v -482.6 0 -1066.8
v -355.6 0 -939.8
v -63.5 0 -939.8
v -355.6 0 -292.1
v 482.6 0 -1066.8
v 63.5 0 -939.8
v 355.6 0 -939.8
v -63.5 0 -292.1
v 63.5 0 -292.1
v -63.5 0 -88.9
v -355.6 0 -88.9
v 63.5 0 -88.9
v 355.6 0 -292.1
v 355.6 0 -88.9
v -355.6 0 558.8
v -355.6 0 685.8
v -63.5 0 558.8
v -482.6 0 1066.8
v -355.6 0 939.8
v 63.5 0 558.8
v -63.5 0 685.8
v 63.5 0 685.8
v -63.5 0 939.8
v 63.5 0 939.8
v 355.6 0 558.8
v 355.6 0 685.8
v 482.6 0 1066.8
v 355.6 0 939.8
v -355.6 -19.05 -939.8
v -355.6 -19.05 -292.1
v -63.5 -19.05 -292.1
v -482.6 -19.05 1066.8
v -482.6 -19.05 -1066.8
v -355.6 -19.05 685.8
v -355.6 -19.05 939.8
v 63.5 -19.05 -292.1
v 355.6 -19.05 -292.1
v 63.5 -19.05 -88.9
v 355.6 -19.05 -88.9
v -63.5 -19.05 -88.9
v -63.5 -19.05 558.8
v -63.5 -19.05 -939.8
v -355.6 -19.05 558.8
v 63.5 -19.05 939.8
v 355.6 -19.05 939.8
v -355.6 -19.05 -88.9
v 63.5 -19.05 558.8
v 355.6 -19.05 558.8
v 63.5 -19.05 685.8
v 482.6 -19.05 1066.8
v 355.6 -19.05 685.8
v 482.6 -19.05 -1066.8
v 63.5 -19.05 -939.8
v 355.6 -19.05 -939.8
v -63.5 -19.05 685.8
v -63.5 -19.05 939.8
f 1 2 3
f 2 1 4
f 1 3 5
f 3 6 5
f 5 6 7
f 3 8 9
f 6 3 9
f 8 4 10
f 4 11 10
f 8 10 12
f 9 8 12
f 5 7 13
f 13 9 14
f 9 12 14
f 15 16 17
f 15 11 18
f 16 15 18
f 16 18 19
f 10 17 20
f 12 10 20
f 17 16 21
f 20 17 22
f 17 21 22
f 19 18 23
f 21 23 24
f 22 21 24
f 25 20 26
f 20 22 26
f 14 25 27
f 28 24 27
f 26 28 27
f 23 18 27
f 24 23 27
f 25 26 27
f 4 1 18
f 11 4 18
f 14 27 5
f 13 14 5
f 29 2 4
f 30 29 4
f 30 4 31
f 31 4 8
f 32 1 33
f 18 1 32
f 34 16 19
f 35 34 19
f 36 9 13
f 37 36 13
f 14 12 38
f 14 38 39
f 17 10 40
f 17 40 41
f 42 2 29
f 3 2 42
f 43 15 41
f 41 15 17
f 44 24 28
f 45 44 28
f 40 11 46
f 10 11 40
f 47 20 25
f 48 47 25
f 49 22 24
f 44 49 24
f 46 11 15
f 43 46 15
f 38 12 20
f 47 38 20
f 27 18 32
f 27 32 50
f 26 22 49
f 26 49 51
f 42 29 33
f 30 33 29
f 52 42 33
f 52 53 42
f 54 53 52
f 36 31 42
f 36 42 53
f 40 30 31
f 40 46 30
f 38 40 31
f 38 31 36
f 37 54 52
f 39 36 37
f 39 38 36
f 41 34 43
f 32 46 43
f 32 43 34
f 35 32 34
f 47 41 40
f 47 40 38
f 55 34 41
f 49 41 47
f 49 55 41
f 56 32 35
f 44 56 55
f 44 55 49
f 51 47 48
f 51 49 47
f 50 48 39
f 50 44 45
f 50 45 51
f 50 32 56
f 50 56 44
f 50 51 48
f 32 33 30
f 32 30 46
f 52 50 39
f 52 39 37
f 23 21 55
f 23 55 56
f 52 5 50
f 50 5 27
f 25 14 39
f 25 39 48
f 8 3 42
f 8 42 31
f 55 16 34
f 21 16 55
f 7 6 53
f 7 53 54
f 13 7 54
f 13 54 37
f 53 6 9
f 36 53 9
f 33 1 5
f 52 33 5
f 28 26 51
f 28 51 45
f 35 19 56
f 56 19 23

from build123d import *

# Parameters (mm, degrees)
F0_W     = 965.2
F0_H     = 2133.6
F0_W_2   = 292.1
F0_H_2   = 647.7
F0_H_3   = 254
F1_DEPTH = 19.05


with BuildPart() as f1:
    # F0 (on Front) → F1 (new body)
    with BuildSketch(Plane.XZ):
        Rectangle(F0_W, F0_H)
        with Locations((-209.55, -615.95)):
            Rectangle(F0_W_2, F0_H_2, mode=Mode.SUBTRACT)
        with Locations((209.55, -615.95)):
            Rectangle(F0_W_2, F0_H_2, mode=Mode.SUBTRACT)
        with Locations((-209.55, 234.95)):
            Rectangle(F0_W_2, F0_H_2, mode=Mode.SUBTRACT)
        with Locations((-209.55, 812.8)):
            Rectangle(F0_W_2, F0_H_3, mode=Mode.SUBTRACT)
        with Locations((209.55, 234.95)):
            Rectangle(F0_W_2, F0_H_2, mode=Mode.SUBTRACT)
        with Locations((209.55, 812.8)):
            Rectangle(F0_W_2, F0_H_3, mode=Mode.SUBTRACT)
    extrude(amount=F1_DEPTH)


solid = f1.part
